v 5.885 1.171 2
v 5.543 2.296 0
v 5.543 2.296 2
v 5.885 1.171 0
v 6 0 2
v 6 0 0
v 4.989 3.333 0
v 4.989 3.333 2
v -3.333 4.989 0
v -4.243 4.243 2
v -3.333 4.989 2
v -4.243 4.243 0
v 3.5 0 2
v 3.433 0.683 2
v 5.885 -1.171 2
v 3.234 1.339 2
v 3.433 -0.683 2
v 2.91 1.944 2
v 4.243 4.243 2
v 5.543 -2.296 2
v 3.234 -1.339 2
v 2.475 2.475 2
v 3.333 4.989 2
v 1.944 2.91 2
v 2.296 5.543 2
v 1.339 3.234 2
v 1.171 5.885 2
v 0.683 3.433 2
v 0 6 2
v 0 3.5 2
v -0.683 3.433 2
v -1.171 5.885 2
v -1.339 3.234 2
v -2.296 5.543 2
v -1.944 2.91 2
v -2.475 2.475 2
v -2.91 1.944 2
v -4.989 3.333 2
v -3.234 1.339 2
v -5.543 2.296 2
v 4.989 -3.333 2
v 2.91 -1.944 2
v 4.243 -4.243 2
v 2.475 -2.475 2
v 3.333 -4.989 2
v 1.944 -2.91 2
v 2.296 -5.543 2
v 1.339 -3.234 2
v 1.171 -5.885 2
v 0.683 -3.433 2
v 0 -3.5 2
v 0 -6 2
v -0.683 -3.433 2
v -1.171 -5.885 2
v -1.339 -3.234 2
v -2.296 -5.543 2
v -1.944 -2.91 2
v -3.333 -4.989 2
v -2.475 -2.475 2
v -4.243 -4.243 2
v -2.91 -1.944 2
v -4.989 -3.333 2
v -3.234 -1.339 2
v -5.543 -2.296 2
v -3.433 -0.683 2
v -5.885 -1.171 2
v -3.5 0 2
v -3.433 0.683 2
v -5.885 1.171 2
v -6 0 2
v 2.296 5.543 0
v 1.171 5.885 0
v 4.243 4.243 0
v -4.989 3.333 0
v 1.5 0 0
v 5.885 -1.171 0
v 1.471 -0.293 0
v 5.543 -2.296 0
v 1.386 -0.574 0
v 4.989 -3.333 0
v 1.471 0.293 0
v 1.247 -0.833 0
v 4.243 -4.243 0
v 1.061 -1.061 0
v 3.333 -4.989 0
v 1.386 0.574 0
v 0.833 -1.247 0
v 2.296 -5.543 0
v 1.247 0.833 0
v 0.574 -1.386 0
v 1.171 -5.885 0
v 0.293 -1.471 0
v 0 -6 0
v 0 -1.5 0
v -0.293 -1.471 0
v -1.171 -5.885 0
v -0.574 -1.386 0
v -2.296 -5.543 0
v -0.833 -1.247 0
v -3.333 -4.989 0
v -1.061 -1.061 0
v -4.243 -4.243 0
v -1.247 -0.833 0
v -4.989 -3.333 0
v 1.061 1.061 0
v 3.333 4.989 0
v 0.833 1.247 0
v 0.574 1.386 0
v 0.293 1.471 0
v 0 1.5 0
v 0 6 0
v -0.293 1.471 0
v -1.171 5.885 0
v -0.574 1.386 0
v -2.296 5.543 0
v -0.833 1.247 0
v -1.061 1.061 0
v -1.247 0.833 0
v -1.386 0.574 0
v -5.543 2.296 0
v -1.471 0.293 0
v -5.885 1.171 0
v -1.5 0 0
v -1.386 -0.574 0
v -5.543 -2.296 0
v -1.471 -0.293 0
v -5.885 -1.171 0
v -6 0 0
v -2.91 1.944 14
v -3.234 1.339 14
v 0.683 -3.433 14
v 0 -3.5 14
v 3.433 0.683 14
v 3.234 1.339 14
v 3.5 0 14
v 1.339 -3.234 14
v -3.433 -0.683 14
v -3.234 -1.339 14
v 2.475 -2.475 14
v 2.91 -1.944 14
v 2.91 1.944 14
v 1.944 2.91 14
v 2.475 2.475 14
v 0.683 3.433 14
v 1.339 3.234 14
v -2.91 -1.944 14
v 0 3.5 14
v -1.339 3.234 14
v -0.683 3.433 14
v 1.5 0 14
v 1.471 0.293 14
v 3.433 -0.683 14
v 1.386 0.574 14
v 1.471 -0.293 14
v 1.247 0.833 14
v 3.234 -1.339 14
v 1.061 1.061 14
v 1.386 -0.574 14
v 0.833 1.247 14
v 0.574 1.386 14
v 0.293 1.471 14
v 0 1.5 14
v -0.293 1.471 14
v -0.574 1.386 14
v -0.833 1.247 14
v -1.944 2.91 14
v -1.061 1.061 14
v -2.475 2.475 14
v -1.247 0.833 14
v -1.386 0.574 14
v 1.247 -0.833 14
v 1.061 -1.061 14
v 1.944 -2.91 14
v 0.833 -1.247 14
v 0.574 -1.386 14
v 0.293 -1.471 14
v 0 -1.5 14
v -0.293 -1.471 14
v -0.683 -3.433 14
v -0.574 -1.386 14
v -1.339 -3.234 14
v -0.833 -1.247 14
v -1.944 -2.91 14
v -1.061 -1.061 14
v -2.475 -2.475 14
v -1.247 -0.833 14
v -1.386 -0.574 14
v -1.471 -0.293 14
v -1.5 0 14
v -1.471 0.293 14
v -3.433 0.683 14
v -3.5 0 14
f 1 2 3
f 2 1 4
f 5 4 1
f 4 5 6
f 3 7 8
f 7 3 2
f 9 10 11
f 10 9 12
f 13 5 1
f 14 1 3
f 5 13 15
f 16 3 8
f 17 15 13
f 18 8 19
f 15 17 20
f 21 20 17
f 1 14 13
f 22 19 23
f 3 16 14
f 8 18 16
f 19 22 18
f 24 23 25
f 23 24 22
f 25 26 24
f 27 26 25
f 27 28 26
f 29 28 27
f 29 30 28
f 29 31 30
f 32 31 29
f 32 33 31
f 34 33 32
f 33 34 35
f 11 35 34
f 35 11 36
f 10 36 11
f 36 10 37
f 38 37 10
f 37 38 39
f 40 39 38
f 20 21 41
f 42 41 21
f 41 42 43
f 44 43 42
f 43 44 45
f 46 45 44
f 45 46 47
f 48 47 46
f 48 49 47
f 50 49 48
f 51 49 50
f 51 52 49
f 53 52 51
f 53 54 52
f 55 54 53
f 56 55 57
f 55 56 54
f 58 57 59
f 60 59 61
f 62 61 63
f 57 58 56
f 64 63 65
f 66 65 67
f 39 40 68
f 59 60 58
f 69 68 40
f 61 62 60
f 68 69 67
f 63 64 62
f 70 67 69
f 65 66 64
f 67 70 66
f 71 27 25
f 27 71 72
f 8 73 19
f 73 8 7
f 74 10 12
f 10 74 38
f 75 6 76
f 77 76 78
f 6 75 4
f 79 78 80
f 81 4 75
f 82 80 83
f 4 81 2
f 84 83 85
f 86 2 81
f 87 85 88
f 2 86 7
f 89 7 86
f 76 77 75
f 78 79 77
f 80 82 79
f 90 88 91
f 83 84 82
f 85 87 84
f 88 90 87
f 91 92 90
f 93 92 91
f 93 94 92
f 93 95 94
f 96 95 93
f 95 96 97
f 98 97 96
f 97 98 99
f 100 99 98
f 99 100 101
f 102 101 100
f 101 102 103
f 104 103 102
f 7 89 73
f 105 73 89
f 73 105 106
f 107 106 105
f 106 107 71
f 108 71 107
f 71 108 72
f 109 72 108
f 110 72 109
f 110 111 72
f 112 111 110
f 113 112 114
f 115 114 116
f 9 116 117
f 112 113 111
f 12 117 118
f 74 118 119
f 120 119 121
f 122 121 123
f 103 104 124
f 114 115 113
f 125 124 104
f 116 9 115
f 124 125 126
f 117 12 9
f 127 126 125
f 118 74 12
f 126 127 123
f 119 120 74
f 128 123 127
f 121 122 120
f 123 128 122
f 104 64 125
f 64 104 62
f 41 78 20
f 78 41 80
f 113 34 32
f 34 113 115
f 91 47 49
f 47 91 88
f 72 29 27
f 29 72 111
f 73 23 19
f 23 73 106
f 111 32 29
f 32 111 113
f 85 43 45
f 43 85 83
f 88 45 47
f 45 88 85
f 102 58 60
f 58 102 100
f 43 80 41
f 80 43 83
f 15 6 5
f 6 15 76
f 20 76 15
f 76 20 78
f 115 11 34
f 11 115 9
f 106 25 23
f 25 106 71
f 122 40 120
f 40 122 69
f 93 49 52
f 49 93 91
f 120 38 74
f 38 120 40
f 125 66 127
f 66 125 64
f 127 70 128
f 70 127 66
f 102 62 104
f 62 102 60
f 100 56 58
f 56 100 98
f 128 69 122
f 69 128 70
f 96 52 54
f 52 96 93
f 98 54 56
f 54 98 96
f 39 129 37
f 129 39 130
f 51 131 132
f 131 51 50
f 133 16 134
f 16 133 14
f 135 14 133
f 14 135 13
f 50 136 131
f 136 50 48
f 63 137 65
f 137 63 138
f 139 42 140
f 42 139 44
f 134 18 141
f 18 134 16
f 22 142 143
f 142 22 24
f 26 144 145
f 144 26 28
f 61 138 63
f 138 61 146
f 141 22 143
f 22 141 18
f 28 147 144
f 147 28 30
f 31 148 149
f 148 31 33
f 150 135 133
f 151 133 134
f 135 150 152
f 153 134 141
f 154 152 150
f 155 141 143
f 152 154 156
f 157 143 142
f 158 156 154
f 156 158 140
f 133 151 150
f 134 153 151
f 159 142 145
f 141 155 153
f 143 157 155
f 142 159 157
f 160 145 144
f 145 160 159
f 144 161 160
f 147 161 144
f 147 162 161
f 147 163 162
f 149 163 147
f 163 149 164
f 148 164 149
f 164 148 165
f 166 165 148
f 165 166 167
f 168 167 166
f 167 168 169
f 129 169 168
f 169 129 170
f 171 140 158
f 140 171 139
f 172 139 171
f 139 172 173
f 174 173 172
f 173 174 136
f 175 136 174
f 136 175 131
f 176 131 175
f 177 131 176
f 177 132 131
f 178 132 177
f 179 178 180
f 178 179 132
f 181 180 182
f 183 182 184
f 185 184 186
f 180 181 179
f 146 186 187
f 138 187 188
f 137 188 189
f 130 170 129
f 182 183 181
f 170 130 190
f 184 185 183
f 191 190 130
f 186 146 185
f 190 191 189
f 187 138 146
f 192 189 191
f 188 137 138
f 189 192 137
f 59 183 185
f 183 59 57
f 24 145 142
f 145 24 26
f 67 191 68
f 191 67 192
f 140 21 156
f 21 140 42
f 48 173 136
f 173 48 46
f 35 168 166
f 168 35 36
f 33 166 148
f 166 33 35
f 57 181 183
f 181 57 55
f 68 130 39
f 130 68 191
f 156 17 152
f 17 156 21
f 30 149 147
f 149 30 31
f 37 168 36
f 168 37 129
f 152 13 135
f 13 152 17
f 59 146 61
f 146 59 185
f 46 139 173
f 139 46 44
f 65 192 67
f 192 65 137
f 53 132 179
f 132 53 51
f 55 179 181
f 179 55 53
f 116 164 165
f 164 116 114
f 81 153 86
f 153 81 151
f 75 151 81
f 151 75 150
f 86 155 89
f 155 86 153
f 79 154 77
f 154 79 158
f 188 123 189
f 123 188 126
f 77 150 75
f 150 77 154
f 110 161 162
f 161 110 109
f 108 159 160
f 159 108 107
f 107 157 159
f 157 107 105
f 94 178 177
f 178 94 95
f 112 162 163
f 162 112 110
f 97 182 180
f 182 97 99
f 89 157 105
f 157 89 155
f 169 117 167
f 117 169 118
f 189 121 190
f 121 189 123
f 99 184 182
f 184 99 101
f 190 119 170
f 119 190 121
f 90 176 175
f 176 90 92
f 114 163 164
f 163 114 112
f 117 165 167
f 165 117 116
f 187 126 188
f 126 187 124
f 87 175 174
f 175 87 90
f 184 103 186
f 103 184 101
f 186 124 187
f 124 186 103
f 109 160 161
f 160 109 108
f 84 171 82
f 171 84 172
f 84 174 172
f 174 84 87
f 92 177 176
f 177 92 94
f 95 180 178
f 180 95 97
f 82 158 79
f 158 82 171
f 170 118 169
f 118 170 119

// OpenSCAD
$fn = 32;

// ----------------------------------------------------------------------
// Micro post: flanged post, 5-20 mm class
// ----------------------------------------------------------------------

// --- parameters (mm) ---
post_d = 7;               // post diameter
post_h = 12;              // post height above the flange
flange_d = 12;            // flange diameter
flange_t = 2;             // flange thickness
bore_d = 3;               // through bore

total_h = post_h + flange_t;  // overall height

difference() {
  union() {
    cylinder(h = flange_t, d = flange_d);
    translate([0, 0, flange_t]) cylinder(h = post_h, d = post_d);
  }
  translate([0, 0, -1]) cylinder(h = total_h + 2, d = bore_d);
}
